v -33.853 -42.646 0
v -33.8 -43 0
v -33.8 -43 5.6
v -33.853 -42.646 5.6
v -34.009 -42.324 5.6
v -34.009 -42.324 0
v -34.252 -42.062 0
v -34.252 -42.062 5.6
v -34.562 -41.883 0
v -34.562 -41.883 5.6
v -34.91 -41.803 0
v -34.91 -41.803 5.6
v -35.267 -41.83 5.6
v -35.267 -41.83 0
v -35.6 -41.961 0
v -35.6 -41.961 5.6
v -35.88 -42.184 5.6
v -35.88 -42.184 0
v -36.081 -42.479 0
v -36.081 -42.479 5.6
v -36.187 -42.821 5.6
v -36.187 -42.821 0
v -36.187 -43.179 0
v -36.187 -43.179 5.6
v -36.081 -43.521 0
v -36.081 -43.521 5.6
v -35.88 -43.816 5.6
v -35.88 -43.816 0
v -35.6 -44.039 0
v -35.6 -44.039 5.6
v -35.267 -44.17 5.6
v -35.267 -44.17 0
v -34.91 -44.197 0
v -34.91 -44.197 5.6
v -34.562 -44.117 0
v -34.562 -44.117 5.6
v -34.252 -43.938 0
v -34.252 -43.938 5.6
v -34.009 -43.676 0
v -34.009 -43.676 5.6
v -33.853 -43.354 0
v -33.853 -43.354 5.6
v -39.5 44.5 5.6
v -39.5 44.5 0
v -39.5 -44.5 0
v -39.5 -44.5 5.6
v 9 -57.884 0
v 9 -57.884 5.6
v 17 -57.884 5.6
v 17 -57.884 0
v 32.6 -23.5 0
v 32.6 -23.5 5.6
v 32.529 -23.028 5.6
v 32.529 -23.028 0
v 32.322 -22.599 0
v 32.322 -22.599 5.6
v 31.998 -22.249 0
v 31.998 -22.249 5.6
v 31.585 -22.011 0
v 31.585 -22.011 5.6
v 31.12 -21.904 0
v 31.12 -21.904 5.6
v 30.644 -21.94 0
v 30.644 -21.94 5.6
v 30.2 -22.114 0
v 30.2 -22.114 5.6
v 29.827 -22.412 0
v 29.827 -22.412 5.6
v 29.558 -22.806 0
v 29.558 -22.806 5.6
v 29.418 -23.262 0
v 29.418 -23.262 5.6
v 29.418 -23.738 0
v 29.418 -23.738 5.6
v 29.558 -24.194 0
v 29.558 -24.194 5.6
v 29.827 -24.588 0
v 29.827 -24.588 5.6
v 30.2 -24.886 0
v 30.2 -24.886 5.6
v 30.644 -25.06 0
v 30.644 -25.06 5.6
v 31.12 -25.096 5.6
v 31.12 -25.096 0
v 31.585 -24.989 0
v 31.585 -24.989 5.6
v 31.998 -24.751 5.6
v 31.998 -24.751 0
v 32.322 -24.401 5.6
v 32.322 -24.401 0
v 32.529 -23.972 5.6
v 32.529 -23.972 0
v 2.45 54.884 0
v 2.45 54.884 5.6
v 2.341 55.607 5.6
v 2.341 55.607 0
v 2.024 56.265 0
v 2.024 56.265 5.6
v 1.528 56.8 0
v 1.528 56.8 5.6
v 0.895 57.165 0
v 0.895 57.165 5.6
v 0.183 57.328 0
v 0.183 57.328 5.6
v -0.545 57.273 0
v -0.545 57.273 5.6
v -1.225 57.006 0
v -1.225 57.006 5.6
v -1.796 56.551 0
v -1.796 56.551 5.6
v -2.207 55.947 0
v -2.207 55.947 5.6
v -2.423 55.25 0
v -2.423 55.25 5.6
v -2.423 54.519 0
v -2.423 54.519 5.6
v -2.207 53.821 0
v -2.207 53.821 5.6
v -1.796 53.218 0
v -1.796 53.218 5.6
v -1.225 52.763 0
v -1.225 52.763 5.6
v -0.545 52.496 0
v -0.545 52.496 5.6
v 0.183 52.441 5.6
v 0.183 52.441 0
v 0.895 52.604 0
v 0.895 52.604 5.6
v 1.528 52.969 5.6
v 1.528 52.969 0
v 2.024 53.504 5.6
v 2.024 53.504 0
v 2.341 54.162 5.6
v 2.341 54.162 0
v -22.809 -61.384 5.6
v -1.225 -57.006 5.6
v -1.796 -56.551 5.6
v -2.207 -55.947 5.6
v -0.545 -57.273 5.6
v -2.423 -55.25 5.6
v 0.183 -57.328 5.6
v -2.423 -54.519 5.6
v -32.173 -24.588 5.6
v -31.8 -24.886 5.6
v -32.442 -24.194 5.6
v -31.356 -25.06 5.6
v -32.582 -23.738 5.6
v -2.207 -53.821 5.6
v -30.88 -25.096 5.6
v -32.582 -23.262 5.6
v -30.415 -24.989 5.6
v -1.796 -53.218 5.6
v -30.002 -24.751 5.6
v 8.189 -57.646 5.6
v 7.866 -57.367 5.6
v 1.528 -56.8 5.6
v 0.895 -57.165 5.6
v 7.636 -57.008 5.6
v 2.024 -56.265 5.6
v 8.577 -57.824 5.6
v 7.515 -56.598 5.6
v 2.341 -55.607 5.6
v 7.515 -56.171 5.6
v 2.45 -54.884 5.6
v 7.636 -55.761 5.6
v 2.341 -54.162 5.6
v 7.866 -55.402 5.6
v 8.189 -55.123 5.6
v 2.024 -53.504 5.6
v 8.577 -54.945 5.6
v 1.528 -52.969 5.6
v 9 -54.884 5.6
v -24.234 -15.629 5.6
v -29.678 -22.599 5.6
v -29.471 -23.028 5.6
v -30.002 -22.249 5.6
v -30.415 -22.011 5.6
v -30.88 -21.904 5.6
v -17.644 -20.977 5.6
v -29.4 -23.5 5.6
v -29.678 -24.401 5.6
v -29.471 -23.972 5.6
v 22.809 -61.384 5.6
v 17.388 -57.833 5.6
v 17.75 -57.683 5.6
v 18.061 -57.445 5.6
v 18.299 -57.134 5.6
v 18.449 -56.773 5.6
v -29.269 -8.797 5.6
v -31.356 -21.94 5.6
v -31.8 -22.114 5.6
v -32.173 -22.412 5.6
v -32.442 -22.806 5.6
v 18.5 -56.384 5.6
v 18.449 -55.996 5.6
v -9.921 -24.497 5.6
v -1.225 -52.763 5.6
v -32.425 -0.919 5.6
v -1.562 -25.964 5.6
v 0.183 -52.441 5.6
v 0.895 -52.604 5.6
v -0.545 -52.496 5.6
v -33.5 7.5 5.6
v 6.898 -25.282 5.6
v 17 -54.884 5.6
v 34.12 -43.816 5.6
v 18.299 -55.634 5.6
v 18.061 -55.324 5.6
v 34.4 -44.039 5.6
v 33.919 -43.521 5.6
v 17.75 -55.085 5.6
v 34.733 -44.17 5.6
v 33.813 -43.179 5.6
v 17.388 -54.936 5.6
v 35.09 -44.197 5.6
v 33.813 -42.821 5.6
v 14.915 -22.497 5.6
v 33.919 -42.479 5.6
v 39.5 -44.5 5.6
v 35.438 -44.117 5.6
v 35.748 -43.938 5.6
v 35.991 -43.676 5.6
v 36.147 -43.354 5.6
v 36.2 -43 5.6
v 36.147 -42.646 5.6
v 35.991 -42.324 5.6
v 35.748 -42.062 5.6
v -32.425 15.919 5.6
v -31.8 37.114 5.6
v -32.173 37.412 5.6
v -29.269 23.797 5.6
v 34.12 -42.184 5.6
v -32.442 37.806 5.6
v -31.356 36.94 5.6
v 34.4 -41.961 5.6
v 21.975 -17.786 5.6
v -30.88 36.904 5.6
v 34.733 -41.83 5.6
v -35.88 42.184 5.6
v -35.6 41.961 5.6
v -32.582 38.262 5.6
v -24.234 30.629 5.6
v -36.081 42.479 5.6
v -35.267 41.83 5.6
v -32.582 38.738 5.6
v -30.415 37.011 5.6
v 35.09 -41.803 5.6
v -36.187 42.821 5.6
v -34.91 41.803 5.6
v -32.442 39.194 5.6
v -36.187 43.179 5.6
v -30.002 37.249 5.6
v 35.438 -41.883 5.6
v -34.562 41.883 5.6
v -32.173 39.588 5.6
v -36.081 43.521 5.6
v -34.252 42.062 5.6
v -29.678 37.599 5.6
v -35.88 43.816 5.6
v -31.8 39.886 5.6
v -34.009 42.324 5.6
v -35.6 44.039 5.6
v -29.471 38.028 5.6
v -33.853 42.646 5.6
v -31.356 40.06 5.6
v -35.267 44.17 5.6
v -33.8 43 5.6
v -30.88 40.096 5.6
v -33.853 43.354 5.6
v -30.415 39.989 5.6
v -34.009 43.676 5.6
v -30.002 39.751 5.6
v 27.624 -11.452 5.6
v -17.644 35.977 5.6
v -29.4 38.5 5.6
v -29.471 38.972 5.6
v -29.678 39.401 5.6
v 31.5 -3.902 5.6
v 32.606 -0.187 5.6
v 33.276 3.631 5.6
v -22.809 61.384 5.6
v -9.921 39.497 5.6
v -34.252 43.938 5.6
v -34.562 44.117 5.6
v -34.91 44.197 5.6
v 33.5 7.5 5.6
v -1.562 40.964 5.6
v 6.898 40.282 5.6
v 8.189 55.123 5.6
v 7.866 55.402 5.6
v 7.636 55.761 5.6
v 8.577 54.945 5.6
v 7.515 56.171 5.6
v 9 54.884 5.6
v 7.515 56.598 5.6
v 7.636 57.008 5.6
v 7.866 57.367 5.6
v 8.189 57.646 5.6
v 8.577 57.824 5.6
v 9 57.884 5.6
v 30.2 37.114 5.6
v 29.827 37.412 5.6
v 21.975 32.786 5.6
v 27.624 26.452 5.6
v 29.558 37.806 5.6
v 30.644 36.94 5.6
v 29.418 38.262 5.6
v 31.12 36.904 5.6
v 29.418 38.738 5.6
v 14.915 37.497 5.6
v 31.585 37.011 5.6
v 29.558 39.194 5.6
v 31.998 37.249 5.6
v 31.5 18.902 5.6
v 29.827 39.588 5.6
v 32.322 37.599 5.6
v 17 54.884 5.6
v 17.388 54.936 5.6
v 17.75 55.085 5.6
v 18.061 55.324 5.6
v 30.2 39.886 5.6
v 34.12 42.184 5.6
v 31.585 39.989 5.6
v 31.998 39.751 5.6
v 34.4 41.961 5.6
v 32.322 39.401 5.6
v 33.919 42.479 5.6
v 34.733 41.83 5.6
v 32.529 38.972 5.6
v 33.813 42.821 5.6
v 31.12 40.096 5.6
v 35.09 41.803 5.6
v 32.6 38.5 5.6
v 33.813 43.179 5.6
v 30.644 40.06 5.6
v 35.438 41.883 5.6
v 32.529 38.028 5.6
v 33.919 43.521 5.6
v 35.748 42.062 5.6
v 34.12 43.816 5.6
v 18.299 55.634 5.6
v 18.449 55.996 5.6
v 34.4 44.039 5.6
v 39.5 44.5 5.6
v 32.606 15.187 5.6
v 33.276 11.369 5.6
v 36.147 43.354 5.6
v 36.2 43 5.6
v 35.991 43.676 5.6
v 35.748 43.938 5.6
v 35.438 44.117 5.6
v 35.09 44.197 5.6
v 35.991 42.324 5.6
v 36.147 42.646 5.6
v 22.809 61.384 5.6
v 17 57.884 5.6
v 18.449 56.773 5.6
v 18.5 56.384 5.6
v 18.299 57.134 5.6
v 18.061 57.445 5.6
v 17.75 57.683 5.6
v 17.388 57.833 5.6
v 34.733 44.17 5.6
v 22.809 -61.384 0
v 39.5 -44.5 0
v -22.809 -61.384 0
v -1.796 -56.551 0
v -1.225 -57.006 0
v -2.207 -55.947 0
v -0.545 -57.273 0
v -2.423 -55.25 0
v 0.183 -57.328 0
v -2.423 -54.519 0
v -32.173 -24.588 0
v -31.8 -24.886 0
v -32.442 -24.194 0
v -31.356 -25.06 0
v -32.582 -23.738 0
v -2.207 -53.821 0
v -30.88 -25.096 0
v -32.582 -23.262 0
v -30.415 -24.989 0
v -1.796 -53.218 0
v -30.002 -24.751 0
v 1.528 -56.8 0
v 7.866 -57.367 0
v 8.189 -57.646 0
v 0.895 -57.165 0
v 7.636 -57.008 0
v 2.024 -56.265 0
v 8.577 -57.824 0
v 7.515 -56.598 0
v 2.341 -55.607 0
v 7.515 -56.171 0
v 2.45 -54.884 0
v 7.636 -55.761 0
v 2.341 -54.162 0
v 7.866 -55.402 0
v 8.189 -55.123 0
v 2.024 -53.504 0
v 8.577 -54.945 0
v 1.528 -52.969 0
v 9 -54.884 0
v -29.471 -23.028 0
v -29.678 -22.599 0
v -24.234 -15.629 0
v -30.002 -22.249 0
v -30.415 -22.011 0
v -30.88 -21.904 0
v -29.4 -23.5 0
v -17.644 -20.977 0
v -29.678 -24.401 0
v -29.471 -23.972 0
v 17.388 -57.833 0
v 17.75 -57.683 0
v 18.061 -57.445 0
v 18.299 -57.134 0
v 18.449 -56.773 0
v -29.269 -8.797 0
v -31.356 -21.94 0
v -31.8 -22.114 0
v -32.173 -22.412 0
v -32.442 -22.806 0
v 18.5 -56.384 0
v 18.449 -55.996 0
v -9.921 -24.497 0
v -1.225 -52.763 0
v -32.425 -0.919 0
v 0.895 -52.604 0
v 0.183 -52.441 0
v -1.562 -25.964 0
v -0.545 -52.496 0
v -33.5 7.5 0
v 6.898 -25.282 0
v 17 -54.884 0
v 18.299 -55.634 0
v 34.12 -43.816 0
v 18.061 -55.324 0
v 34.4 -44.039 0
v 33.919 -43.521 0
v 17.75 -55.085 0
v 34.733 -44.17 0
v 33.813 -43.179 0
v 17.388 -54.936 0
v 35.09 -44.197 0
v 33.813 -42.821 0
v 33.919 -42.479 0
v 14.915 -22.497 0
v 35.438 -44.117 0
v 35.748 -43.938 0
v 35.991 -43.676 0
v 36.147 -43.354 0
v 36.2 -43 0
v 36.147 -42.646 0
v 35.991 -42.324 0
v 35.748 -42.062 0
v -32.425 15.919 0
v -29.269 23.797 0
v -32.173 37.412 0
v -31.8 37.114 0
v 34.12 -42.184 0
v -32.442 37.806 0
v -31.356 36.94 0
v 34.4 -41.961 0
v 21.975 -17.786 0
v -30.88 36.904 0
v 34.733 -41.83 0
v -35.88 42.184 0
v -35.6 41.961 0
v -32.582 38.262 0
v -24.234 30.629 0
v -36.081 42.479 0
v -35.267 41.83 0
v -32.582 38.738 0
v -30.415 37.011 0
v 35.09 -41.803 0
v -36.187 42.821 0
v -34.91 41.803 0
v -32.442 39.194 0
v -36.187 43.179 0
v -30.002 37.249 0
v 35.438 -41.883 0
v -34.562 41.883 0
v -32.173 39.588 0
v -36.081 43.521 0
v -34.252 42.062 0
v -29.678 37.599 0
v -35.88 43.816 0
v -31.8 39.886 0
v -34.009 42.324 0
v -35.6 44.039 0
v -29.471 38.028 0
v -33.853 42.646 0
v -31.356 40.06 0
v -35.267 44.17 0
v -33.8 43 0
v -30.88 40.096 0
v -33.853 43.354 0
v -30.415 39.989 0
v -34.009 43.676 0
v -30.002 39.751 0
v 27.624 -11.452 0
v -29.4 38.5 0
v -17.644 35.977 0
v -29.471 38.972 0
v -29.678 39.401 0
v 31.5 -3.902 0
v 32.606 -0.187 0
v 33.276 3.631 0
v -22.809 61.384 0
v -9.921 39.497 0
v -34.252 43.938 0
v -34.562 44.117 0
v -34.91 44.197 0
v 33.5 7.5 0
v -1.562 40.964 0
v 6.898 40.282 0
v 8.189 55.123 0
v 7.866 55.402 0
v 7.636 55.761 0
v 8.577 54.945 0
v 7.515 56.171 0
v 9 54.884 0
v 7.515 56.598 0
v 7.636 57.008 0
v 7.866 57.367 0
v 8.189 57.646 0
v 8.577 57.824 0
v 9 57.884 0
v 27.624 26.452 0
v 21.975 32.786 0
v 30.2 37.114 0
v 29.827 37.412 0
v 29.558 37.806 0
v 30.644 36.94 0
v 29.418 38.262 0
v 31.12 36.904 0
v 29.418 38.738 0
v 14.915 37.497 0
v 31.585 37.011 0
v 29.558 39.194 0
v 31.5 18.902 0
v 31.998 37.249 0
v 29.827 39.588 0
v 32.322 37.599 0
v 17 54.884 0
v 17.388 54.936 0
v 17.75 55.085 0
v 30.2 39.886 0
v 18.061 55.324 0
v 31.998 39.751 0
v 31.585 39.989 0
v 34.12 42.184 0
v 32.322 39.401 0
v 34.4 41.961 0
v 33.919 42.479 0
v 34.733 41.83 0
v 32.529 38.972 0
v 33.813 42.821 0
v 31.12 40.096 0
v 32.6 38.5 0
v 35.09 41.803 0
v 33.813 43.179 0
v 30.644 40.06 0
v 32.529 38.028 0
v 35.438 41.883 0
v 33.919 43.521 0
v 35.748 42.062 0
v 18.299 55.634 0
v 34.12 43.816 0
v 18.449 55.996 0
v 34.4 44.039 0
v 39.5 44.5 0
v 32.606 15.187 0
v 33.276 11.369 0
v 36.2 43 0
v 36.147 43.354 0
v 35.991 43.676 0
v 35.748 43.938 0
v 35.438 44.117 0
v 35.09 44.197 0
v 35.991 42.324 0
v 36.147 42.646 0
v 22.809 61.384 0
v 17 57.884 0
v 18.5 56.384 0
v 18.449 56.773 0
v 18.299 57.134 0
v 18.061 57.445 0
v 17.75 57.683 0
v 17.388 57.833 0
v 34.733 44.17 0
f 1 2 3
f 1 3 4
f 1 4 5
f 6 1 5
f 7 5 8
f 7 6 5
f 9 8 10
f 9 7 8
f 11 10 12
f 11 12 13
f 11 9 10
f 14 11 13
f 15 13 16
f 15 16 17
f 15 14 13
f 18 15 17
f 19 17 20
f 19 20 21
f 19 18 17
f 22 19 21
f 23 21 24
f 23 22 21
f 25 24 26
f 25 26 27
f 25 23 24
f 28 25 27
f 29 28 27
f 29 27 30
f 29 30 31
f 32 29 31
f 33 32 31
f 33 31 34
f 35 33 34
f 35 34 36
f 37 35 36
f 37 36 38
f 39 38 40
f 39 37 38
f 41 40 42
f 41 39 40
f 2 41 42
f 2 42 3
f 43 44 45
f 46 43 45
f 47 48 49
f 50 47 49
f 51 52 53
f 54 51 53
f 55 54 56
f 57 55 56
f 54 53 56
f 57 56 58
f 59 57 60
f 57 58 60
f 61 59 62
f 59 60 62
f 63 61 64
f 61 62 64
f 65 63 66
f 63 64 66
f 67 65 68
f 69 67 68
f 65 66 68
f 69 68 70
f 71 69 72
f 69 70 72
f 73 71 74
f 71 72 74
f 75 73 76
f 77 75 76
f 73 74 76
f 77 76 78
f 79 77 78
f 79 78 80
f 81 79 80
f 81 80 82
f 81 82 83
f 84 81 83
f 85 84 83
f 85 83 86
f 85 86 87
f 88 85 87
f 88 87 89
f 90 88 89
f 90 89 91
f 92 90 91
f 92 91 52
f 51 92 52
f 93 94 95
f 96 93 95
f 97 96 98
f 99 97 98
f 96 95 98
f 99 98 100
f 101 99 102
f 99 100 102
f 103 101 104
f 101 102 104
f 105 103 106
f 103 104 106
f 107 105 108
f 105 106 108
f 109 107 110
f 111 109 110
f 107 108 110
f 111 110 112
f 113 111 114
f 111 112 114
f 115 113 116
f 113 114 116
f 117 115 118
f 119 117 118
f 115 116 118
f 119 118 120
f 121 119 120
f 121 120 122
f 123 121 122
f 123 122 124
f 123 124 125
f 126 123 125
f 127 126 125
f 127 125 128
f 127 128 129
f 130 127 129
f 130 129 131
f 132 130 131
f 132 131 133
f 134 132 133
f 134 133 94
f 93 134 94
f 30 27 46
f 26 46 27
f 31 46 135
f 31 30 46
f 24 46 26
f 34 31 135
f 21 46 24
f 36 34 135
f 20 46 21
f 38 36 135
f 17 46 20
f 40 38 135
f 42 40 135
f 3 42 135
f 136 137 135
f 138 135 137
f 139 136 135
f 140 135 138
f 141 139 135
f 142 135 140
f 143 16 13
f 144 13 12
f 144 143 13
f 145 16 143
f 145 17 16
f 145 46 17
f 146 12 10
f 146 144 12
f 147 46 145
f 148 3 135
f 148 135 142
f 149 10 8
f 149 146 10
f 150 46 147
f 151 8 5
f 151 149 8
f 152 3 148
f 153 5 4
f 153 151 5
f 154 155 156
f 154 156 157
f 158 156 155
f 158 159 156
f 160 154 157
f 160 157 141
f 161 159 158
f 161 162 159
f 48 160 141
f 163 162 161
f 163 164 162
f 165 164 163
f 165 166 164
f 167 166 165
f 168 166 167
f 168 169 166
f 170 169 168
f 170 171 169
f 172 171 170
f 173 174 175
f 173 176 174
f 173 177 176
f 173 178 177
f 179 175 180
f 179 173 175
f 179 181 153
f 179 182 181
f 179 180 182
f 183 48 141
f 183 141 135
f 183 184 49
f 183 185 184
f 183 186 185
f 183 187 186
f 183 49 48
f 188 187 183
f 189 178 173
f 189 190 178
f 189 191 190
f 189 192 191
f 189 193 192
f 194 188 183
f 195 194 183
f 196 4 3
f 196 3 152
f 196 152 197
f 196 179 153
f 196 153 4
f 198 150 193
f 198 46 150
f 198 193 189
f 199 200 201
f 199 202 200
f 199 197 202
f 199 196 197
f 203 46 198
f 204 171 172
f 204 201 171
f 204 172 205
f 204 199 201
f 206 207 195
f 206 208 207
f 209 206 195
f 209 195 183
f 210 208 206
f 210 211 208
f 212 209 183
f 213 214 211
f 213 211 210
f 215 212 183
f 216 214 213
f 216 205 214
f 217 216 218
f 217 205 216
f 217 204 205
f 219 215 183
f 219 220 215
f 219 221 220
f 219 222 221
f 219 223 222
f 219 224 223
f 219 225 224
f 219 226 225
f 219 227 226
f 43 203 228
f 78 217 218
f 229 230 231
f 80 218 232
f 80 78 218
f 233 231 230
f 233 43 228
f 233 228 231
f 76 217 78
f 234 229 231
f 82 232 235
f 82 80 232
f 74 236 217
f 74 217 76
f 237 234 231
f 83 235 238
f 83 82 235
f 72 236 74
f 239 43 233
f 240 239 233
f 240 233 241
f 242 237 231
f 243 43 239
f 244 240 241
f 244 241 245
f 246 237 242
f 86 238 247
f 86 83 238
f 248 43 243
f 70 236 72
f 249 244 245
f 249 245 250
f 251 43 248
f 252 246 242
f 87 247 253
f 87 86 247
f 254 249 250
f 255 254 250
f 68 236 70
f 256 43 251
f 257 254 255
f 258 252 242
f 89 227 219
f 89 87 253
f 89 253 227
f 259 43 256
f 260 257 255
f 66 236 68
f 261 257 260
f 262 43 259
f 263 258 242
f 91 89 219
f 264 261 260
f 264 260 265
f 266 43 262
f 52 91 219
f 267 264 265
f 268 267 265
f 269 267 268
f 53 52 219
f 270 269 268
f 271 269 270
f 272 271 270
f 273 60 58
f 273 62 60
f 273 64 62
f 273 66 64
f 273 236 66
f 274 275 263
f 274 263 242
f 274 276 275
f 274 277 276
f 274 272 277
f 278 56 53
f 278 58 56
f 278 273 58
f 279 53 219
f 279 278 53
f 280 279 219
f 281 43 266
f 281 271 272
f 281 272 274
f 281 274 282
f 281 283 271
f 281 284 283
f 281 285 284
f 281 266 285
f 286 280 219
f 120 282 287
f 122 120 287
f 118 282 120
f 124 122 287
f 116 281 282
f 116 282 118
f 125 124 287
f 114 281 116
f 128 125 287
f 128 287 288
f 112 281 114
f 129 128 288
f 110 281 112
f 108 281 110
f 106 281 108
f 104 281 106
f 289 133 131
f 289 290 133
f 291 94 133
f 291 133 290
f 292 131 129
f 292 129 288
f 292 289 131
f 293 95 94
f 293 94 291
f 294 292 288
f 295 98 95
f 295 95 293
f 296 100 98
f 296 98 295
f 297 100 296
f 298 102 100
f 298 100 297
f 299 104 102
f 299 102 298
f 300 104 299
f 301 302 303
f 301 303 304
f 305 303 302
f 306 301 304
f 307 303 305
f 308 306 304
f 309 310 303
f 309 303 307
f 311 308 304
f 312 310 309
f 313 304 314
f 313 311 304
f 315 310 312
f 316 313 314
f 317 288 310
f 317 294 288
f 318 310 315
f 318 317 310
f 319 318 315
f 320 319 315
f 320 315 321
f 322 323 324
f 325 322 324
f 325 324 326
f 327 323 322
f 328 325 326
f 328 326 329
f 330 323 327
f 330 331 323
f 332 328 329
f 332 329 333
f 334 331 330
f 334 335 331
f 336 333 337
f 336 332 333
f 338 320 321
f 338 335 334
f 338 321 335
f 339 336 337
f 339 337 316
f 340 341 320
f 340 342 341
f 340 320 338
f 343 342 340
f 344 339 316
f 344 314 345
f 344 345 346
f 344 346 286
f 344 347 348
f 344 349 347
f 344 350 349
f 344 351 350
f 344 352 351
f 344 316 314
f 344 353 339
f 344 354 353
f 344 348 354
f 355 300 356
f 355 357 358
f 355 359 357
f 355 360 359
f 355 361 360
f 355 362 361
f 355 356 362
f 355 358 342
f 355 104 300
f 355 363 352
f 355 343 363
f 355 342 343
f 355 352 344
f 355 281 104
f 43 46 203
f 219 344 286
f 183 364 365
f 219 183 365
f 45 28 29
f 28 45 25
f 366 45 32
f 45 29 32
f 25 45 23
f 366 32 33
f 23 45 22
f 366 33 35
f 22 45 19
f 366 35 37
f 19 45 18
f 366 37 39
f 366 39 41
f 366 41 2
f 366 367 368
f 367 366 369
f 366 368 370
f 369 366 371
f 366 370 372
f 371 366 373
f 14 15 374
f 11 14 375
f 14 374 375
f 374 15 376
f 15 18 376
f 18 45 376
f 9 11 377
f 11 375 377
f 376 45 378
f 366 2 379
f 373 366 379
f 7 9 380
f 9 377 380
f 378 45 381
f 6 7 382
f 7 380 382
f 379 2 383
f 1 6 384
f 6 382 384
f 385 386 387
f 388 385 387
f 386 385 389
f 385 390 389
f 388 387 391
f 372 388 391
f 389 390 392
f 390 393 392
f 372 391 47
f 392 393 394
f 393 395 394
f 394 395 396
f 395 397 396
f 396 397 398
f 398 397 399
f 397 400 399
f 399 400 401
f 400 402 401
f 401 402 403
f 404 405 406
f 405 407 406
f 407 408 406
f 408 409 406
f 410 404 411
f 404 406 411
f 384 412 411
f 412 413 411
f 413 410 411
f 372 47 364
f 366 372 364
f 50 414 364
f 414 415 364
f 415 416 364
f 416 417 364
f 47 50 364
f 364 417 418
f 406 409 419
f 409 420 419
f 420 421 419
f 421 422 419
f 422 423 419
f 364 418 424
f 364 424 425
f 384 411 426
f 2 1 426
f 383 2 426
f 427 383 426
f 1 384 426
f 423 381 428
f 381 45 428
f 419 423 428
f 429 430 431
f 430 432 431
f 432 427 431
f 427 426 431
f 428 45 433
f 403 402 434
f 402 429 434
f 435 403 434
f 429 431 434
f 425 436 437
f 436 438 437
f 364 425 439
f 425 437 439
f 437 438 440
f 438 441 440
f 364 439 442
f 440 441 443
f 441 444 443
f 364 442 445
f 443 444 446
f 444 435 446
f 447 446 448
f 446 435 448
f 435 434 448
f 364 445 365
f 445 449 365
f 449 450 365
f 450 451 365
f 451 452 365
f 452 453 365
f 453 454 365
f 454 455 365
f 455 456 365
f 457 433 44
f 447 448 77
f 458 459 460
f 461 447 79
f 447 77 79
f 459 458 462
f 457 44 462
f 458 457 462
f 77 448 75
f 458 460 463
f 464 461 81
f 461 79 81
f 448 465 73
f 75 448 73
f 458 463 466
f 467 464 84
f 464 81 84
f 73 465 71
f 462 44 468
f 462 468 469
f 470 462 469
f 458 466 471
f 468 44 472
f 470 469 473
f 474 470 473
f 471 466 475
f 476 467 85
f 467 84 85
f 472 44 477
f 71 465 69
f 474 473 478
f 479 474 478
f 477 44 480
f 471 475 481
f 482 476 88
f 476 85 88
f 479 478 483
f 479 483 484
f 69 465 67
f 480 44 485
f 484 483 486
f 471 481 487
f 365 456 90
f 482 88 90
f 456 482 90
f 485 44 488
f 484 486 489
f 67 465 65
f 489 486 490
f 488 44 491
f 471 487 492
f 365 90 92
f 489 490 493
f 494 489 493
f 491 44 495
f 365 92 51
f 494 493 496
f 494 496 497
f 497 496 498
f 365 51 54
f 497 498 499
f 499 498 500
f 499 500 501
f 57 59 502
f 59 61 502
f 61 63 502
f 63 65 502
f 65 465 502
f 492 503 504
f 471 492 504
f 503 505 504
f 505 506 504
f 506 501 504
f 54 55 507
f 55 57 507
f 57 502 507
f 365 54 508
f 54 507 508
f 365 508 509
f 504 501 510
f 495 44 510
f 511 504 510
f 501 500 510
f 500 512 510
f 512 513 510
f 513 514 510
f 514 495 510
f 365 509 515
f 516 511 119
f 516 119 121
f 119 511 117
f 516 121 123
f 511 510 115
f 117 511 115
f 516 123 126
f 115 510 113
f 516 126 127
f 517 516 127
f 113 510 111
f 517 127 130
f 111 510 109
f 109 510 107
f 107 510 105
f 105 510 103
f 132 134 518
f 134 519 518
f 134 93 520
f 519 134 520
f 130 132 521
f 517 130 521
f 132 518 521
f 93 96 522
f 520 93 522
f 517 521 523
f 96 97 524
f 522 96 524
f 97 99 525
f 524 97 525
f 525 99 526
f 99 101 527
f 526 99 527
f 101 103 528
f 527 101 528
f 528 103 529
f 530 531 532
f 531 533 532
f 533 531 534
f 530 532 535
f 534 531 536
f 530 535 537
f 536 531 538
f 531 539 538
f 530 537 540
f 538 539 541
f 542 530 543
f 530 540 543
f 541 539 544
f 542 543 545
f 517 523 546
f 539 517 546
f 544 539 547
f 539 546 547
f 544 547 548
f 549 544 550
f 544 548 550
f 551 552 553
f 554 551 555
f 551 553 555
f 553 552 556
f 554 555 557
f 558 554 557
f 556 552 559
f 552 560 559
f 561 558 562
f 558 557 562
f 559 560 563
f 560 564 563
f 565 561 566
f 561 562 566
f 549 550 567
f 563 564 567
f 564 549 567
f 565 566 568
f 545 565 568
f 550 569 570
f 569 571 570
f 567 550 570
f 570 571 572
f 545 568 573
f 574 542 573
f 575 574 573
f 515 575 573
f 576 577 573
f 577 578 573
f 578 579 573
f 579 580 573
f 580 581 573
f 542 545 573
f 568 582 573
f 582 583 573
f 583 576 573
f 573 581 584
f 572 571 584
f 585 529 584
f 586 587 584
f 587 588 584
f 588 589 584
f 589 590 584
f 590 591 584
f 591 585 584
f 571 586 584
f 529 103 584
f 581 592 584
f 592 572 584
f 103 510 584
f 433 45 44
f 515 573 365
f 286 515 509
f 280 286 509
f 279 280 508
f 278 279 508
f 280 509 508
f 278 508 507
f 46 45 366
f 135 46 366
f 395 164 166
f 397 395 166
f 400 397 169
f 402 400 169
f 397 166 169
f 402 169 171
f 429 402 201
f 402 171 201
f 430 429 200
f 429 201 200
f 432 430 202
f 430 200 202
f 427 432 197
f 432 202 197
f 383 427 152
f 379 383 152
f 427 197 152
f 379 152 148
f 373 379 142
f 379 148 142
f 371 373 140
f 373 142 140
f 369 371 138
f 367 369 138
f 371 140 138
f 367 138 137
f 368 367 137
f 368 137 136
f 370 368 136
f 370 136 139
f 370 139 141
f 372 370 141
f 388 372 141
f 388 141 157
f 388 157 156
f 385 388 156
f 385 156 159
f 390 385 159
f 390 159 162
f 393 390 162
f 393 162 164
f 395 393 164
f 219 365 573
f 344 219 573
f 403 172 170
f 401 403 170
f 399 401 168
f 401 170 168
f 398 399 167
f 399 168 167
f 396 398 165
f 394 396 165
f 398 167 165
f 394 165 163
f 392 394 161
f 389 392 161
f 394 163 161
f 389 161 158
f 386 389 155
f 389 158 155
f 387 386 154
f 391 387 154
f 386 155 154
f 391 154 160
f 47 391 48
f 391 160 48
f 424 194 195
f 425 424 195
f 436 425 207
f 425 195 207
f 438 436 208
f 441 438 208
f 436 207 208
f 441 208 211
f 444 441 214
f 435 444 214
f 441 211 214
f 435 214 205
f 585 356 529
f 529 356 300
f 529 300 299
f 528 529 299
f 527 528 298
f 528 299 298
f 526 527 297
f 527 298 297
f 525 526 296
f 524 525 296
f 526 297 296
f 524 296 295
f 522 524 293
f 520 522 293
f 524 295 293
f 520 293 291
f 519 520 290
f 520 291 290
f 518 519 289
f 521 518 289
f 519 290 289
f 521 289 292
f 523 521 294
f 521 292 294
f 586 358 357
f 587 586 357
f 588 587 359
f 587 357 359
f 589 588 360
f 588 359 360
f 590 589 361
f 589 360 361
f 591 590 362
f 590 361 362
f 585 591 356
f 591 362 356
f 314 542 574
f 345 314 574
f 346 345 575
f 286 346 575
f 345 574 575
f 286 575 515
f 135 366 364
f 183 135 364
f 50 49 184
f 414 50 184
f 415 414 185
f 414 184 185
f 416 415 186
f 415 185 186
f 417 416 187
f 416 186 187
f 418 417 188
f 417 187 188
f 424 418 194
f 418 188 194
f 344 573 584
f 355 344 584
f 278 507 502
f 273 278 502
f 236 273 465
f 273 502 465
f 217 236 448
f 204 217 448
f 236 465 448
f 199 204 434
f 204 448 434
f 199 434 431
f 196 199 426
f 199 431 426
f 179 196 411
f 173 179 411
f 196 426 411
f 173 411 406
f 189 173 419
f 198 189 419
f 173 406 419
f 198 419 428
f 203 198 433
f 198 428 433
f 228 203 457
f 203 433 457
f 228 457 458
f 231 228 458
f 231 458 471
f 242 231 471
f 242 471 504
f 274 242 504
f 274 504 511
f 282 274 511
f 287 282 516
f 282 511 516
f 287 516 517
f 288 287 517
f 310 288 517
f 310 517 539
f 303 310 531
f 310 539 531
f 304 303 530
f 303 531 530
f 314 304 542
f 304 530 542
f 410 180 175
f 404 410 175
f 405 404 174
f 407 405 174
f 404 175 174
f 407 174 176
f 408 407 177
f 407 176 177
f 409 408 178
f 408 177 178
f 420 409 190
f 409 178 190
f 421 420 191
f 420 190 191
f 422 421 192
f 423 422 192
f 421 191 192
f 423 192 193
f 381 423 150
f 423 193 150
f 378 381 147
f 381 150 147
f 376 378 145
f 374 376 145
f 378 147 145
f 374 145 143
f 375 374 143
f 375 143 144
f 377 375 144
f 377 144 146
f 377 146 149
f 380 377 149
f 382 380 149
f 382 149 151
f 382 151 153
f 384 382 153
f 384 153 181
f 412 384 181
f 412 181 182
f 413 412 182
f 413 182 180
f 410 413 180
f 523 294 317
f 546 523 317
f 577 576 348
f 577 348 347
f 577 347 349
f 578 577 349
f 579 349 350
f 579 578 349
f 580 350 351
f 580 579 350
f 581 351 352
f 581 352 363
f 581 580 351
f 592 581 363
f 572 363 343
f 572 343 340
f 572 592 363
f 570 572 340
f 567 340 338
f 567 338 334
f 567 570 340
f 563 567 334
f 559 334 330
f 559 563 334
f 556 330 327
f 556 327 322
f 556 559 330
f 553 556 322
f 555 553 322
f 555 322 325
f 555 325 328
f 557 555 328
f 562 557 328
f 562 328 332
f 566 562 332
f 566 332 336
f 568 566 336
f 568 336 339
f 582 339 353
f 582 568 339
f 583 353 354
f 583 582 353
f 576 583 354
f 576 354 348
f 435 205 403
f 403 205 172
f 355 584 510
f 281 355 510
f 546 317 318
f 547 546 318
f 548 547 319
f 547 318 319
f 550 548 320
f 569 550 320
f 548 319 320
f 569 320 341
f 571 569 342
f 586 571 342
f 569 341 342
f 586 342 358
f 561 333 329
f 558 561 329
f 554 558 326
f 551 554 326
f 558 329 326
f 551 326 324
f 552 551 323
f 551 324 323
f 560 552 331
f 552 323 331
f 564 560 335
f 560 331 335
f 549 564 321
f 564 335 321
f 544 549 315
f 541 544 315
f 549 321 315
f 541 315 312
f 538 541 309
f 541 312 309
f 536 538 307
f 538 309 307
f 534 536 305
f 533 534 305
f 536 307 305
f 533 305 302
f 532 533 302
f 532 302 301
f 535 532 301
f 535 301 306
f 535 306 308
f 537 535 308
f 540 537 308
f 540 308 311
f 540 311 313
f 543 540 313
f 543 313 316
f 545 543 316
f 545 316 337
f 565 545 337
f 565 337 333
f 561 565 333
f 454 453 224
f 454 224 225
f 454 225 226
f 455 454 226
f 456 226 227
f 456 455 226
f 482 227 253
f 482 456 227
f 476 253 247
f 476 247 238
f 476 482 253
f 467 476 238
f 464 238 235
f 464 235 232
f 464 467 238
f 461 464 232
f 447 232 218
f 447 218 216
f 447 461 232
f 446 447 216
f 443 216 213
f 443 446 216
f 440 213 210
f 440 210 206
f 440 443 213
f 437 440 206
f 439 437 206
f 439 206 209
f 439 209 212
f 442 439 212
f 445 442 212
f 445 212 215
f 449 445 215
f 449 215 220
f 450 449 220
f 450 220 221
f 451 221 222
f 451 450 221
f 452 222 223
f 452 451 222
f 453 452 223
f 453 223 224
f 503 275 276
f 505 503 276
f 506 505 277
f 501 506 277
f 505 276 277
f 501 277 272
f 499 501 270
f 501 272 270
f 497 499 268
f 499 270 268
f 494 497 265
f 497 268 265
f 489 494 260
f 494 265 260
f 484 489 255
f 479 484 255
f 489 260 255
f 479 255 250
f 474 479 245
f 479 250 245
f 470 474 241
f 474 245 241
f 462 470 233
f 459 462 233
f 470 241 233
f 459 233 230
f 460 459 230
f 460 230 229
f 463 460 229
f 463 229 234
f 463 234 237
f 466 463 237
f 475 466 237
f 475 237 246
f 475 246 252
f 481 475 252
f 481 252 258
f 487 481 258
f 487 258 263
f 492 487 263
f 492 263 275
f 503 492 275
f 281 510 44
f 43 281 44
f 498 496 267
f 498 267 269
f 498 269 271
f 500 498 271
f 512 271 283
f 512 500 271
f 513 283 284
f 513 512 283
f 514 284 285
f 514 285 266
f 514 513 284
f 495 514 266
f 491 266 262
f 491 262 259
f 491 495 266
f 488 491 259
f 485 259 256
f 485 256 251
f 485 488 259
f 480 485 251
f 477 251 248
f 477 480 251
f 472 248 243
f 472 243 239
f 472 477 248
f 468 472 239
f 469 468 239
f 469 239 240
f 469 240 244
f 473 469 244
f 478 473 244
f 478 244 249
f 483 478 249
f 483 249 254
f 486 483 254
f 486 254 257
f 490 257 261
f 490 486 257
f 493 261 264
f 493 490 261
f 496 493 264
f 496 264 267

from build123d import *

# Parameters (mm, degrees)
F0_R     = 1.2
F0_R_2   = 2.05
F1_DEPTH = 5.6
F2_R     = 1.6
F2_R_2   = 2.45
F3_DEPTH = 25


with BuildPart() as f1:
    # F0 (on Top) → F1 (new body)
    with BuildSketch(Plane.XY):
        with BuildLine():
            Line((31.5, 25.5), (39.5, 25.5))
            Line((39.5, 25.5), (39.5, 44.5))
            Line((39.5, 44.5), (22.808842361, 61.3844171166))
            Line((22.808842361, 61.3844171166), (0, 61.3844171166))
            Line((0, 61.3844171166), (-22.808842361, 61.3844171166))
            Line((-22.808842361, 61.3844171166), (-39.5, 44.5))
            Line((-39.5, 44.5), (-39.5, 25.5))
            Line((-39.5, 25.5), (-31.5, 25.5))
            Line((-31.5, 25.5), (-31.5, 18.901754251))
            ThreePointArc((-31.5, 18.901754251), (0, 41), (31.5, 18.901754251))
            Line((31.5, 18.901754251), (31.5, 25.5))
        make_face()
        with Locations((-35, 43)):
            Circle(F0_R, mode=Mode.SUBTRACT)
        with Locations((0, 54.8844171166)):
            Circle(F0_R_2, mode=Mode.SUBTRACT)
        with Locations((35, 43)):
            Circle(F0_R, mode=Mode.SUBTRACT)
        with BuildLine():
            Line((22.808842361, -61.3844171166), (39.5, -44.5))
            Line((39.5, -44.5), (39.5, -9.5))
            Line((39.5, -9.5), (31.5, -9.5))
            Line((31.5, -9.5), (31.5, -3.901754251))
            ThreePointArc((31.5, -3.901754251), (0, -26), (-31.5, -3.901754251))
            Line((-31.5, -3.901754251), (-31.5, -9.5))
            Line((-31.5, -9.5), (-39.5, -9.5))
            Line((-39.5, -9.5), (-39.5, -44.5))
            Line((-39.5, -44.5), (-22.808842361, -61.3844171166))
            Line((-22.808842361, -61.3844171166), (0, -61.3844171166))
            Line((0, -61.3844171166), (22.808842361, -61.3844171166))
        make_face()
        with Locations((-35, -43)):
            Circle(F0_R, mode=Mode.SUBTRACT)
        with Locations((0, -54.8844171166)):
            Circle(F0_R_2, mode=Mode.SUBTRACT)
        with Locations((35, -43)):
            Circle(F0_R, mode=Mode.SUBTRACT)
        with BuildLine():
            Line((-31.5, -9.5), (-31.5, -3.901754251))
            ThreePointArc((-31.5, -3.901754251), (-33.5, 7.5), (-31.5, 18.901754251))
            Line((-31.5, 18.901754251), (-31.5, 25.5))
            Line((-31.5, 25.5), (-39.5, 25.5))
            Line((-39.5, 25.5), (-39.5, -9.5))
            Line((-39.5, -9.5), (-31.5, -9.5))
        make_face()
        with BuildLine():
            Line((31.5, -9.5), (39.5, -9.5))
            Line((39.5, -9.5), (39.5, 25.5))
            Line((39.5, 25.5), (31.5, 25.5))
            Line((31.5, 25.5), (31.5, 18.901754251))
            ThreePointArc((31.5, 18.901754251), (32.9962119038, 13.2879184514), (33.5, 7.5))
            ThreePointArc((33.5, 7.5), (32.9962119038, 1.7120815486), (31.5, -3.901754251))
            Line((31.5, -3.901754251), (31.5, -9.5))
        make_face()
    extrude(amount=F1_DEPTH)

    # F2 (on face) → F3 (cut)
    with BuildSketch(Plane.XY.offset(5.6)):
        with Locations((-31, 38.5)):
            Circle(F2_R)
        with Locations((31, 38.5)):
            Circle(F2_R)
        with Locations((-31, -23.5)):
            Circle(F2_R)
        with Locations((31, -23.5)):
            Circle(F2_R)
        with Locations((0, 54.8844171166)):
            Circle(F2_R_2)
        with Locations((0, -54.8844171166)):
            Circle(F2_R_2)
        with BuildLine():
            ThreePointArc((10.5, 56.3844171166), (10.0606601718, 57.4450772884), (9, 57.8844171166))
            Line((9, 57.8844171166), (9, 54.8844171166))
            ThreePointArc((9, 54.8844171166), (10.0606601718, 55.3237569449), (10.5, 56.3844171166))
        make_face()
        with BuildLine():
            Line((17, 57.8844171166), (9, 57.8844171166))
            ThreePointArc((9, 57.8844171166), (10.0606601718, 57.4450772884), (10.5, 56.3844171166))
            ThreePointArc((10.5, 56.3844171166), (10.0606601718, 55.3237569449), (9, 54.8844171166))
            Line((9, 54.8844171166), (17, 54.8844171166))
            ThreePointArc((17, 54.8844171166), (15.5, 56.3844171166), (17, 57.8844171166))
        make_face()
        with BuildLine():
            Line((9, 54.8844171166), (9, 57.8844171166))
            ThreePointArc((9, 57.8844171166), (7.5, 56.3844171166), (9, 54.8844171166))
        make_face()
        with BuildLine():
            ThreePointArc((18.5, 56.3844171166), (18.0606601718, 57.4450772884), (17, 57.8844171166))
            Line((17, 57.8844171166), (17, 54.8844171166))
            ThreePointArc((17, 54.8844171166), (18.0606601718, 55.3237569449), (18.5, 56.3844171166))
        make_face()
        with BuildLine():
            Line((17, 54.8844171166), (17, 57.8844171166))
            ThreePointArc((17, 57.8844171166), (15.5, 56.3844171166), (17, 54.8844171166))
        make_face()
        with BuildLine():
            ThreePointArc((9, -57.8844171166), (10.0606601718, -57.4450772884), (10.5, -56.3844171166))
            ThreePointArc((10.5, -56.3844171166), (10.0606601718, -55.3237569449), (9, -54.8844171166))
            ThreePointArc((9, -54.8844171166), (7.5, -56.3844171166), (9, -57.8844171166))
        make_face()
        with BuildLine():
            ThreePointArc((9, -54.8844171166), (10.0606601718, -55.3237569449), (10.5, -56.3844171166))
            ThreePointArc((10.5, -56.3844171166), (10.0606601718, -57.4450772884), (9, -57.8844171166))
            Line((9, -57.8844171166), (17, -57.8844171166))
            ThreePointArc((17, -57.8844171166), (15.5, -56.3844171166), (17, -54.8844171166))
            Line((17, -54.8844171166), (9, -54.8844171166))
        make_face()
        with BuildLine():
            ThreePointArc((18.5, -56.3844171166), (18.0606601718, -55.3237569449), (17, -54.8844171166))
            ThreePointArc((17, -54.8844171166), (15.5, -56.3844171166), (17, -57.8844171166))
            ThreePointArc((17, -57.8844171166), (18.0606601718, -57.4450772884), (18.5, -56.3844171166))
        make_face()
    extrude(amount=-F3_DEPTH, mode=Mode.SUBTRACT)


solid = f1.part
